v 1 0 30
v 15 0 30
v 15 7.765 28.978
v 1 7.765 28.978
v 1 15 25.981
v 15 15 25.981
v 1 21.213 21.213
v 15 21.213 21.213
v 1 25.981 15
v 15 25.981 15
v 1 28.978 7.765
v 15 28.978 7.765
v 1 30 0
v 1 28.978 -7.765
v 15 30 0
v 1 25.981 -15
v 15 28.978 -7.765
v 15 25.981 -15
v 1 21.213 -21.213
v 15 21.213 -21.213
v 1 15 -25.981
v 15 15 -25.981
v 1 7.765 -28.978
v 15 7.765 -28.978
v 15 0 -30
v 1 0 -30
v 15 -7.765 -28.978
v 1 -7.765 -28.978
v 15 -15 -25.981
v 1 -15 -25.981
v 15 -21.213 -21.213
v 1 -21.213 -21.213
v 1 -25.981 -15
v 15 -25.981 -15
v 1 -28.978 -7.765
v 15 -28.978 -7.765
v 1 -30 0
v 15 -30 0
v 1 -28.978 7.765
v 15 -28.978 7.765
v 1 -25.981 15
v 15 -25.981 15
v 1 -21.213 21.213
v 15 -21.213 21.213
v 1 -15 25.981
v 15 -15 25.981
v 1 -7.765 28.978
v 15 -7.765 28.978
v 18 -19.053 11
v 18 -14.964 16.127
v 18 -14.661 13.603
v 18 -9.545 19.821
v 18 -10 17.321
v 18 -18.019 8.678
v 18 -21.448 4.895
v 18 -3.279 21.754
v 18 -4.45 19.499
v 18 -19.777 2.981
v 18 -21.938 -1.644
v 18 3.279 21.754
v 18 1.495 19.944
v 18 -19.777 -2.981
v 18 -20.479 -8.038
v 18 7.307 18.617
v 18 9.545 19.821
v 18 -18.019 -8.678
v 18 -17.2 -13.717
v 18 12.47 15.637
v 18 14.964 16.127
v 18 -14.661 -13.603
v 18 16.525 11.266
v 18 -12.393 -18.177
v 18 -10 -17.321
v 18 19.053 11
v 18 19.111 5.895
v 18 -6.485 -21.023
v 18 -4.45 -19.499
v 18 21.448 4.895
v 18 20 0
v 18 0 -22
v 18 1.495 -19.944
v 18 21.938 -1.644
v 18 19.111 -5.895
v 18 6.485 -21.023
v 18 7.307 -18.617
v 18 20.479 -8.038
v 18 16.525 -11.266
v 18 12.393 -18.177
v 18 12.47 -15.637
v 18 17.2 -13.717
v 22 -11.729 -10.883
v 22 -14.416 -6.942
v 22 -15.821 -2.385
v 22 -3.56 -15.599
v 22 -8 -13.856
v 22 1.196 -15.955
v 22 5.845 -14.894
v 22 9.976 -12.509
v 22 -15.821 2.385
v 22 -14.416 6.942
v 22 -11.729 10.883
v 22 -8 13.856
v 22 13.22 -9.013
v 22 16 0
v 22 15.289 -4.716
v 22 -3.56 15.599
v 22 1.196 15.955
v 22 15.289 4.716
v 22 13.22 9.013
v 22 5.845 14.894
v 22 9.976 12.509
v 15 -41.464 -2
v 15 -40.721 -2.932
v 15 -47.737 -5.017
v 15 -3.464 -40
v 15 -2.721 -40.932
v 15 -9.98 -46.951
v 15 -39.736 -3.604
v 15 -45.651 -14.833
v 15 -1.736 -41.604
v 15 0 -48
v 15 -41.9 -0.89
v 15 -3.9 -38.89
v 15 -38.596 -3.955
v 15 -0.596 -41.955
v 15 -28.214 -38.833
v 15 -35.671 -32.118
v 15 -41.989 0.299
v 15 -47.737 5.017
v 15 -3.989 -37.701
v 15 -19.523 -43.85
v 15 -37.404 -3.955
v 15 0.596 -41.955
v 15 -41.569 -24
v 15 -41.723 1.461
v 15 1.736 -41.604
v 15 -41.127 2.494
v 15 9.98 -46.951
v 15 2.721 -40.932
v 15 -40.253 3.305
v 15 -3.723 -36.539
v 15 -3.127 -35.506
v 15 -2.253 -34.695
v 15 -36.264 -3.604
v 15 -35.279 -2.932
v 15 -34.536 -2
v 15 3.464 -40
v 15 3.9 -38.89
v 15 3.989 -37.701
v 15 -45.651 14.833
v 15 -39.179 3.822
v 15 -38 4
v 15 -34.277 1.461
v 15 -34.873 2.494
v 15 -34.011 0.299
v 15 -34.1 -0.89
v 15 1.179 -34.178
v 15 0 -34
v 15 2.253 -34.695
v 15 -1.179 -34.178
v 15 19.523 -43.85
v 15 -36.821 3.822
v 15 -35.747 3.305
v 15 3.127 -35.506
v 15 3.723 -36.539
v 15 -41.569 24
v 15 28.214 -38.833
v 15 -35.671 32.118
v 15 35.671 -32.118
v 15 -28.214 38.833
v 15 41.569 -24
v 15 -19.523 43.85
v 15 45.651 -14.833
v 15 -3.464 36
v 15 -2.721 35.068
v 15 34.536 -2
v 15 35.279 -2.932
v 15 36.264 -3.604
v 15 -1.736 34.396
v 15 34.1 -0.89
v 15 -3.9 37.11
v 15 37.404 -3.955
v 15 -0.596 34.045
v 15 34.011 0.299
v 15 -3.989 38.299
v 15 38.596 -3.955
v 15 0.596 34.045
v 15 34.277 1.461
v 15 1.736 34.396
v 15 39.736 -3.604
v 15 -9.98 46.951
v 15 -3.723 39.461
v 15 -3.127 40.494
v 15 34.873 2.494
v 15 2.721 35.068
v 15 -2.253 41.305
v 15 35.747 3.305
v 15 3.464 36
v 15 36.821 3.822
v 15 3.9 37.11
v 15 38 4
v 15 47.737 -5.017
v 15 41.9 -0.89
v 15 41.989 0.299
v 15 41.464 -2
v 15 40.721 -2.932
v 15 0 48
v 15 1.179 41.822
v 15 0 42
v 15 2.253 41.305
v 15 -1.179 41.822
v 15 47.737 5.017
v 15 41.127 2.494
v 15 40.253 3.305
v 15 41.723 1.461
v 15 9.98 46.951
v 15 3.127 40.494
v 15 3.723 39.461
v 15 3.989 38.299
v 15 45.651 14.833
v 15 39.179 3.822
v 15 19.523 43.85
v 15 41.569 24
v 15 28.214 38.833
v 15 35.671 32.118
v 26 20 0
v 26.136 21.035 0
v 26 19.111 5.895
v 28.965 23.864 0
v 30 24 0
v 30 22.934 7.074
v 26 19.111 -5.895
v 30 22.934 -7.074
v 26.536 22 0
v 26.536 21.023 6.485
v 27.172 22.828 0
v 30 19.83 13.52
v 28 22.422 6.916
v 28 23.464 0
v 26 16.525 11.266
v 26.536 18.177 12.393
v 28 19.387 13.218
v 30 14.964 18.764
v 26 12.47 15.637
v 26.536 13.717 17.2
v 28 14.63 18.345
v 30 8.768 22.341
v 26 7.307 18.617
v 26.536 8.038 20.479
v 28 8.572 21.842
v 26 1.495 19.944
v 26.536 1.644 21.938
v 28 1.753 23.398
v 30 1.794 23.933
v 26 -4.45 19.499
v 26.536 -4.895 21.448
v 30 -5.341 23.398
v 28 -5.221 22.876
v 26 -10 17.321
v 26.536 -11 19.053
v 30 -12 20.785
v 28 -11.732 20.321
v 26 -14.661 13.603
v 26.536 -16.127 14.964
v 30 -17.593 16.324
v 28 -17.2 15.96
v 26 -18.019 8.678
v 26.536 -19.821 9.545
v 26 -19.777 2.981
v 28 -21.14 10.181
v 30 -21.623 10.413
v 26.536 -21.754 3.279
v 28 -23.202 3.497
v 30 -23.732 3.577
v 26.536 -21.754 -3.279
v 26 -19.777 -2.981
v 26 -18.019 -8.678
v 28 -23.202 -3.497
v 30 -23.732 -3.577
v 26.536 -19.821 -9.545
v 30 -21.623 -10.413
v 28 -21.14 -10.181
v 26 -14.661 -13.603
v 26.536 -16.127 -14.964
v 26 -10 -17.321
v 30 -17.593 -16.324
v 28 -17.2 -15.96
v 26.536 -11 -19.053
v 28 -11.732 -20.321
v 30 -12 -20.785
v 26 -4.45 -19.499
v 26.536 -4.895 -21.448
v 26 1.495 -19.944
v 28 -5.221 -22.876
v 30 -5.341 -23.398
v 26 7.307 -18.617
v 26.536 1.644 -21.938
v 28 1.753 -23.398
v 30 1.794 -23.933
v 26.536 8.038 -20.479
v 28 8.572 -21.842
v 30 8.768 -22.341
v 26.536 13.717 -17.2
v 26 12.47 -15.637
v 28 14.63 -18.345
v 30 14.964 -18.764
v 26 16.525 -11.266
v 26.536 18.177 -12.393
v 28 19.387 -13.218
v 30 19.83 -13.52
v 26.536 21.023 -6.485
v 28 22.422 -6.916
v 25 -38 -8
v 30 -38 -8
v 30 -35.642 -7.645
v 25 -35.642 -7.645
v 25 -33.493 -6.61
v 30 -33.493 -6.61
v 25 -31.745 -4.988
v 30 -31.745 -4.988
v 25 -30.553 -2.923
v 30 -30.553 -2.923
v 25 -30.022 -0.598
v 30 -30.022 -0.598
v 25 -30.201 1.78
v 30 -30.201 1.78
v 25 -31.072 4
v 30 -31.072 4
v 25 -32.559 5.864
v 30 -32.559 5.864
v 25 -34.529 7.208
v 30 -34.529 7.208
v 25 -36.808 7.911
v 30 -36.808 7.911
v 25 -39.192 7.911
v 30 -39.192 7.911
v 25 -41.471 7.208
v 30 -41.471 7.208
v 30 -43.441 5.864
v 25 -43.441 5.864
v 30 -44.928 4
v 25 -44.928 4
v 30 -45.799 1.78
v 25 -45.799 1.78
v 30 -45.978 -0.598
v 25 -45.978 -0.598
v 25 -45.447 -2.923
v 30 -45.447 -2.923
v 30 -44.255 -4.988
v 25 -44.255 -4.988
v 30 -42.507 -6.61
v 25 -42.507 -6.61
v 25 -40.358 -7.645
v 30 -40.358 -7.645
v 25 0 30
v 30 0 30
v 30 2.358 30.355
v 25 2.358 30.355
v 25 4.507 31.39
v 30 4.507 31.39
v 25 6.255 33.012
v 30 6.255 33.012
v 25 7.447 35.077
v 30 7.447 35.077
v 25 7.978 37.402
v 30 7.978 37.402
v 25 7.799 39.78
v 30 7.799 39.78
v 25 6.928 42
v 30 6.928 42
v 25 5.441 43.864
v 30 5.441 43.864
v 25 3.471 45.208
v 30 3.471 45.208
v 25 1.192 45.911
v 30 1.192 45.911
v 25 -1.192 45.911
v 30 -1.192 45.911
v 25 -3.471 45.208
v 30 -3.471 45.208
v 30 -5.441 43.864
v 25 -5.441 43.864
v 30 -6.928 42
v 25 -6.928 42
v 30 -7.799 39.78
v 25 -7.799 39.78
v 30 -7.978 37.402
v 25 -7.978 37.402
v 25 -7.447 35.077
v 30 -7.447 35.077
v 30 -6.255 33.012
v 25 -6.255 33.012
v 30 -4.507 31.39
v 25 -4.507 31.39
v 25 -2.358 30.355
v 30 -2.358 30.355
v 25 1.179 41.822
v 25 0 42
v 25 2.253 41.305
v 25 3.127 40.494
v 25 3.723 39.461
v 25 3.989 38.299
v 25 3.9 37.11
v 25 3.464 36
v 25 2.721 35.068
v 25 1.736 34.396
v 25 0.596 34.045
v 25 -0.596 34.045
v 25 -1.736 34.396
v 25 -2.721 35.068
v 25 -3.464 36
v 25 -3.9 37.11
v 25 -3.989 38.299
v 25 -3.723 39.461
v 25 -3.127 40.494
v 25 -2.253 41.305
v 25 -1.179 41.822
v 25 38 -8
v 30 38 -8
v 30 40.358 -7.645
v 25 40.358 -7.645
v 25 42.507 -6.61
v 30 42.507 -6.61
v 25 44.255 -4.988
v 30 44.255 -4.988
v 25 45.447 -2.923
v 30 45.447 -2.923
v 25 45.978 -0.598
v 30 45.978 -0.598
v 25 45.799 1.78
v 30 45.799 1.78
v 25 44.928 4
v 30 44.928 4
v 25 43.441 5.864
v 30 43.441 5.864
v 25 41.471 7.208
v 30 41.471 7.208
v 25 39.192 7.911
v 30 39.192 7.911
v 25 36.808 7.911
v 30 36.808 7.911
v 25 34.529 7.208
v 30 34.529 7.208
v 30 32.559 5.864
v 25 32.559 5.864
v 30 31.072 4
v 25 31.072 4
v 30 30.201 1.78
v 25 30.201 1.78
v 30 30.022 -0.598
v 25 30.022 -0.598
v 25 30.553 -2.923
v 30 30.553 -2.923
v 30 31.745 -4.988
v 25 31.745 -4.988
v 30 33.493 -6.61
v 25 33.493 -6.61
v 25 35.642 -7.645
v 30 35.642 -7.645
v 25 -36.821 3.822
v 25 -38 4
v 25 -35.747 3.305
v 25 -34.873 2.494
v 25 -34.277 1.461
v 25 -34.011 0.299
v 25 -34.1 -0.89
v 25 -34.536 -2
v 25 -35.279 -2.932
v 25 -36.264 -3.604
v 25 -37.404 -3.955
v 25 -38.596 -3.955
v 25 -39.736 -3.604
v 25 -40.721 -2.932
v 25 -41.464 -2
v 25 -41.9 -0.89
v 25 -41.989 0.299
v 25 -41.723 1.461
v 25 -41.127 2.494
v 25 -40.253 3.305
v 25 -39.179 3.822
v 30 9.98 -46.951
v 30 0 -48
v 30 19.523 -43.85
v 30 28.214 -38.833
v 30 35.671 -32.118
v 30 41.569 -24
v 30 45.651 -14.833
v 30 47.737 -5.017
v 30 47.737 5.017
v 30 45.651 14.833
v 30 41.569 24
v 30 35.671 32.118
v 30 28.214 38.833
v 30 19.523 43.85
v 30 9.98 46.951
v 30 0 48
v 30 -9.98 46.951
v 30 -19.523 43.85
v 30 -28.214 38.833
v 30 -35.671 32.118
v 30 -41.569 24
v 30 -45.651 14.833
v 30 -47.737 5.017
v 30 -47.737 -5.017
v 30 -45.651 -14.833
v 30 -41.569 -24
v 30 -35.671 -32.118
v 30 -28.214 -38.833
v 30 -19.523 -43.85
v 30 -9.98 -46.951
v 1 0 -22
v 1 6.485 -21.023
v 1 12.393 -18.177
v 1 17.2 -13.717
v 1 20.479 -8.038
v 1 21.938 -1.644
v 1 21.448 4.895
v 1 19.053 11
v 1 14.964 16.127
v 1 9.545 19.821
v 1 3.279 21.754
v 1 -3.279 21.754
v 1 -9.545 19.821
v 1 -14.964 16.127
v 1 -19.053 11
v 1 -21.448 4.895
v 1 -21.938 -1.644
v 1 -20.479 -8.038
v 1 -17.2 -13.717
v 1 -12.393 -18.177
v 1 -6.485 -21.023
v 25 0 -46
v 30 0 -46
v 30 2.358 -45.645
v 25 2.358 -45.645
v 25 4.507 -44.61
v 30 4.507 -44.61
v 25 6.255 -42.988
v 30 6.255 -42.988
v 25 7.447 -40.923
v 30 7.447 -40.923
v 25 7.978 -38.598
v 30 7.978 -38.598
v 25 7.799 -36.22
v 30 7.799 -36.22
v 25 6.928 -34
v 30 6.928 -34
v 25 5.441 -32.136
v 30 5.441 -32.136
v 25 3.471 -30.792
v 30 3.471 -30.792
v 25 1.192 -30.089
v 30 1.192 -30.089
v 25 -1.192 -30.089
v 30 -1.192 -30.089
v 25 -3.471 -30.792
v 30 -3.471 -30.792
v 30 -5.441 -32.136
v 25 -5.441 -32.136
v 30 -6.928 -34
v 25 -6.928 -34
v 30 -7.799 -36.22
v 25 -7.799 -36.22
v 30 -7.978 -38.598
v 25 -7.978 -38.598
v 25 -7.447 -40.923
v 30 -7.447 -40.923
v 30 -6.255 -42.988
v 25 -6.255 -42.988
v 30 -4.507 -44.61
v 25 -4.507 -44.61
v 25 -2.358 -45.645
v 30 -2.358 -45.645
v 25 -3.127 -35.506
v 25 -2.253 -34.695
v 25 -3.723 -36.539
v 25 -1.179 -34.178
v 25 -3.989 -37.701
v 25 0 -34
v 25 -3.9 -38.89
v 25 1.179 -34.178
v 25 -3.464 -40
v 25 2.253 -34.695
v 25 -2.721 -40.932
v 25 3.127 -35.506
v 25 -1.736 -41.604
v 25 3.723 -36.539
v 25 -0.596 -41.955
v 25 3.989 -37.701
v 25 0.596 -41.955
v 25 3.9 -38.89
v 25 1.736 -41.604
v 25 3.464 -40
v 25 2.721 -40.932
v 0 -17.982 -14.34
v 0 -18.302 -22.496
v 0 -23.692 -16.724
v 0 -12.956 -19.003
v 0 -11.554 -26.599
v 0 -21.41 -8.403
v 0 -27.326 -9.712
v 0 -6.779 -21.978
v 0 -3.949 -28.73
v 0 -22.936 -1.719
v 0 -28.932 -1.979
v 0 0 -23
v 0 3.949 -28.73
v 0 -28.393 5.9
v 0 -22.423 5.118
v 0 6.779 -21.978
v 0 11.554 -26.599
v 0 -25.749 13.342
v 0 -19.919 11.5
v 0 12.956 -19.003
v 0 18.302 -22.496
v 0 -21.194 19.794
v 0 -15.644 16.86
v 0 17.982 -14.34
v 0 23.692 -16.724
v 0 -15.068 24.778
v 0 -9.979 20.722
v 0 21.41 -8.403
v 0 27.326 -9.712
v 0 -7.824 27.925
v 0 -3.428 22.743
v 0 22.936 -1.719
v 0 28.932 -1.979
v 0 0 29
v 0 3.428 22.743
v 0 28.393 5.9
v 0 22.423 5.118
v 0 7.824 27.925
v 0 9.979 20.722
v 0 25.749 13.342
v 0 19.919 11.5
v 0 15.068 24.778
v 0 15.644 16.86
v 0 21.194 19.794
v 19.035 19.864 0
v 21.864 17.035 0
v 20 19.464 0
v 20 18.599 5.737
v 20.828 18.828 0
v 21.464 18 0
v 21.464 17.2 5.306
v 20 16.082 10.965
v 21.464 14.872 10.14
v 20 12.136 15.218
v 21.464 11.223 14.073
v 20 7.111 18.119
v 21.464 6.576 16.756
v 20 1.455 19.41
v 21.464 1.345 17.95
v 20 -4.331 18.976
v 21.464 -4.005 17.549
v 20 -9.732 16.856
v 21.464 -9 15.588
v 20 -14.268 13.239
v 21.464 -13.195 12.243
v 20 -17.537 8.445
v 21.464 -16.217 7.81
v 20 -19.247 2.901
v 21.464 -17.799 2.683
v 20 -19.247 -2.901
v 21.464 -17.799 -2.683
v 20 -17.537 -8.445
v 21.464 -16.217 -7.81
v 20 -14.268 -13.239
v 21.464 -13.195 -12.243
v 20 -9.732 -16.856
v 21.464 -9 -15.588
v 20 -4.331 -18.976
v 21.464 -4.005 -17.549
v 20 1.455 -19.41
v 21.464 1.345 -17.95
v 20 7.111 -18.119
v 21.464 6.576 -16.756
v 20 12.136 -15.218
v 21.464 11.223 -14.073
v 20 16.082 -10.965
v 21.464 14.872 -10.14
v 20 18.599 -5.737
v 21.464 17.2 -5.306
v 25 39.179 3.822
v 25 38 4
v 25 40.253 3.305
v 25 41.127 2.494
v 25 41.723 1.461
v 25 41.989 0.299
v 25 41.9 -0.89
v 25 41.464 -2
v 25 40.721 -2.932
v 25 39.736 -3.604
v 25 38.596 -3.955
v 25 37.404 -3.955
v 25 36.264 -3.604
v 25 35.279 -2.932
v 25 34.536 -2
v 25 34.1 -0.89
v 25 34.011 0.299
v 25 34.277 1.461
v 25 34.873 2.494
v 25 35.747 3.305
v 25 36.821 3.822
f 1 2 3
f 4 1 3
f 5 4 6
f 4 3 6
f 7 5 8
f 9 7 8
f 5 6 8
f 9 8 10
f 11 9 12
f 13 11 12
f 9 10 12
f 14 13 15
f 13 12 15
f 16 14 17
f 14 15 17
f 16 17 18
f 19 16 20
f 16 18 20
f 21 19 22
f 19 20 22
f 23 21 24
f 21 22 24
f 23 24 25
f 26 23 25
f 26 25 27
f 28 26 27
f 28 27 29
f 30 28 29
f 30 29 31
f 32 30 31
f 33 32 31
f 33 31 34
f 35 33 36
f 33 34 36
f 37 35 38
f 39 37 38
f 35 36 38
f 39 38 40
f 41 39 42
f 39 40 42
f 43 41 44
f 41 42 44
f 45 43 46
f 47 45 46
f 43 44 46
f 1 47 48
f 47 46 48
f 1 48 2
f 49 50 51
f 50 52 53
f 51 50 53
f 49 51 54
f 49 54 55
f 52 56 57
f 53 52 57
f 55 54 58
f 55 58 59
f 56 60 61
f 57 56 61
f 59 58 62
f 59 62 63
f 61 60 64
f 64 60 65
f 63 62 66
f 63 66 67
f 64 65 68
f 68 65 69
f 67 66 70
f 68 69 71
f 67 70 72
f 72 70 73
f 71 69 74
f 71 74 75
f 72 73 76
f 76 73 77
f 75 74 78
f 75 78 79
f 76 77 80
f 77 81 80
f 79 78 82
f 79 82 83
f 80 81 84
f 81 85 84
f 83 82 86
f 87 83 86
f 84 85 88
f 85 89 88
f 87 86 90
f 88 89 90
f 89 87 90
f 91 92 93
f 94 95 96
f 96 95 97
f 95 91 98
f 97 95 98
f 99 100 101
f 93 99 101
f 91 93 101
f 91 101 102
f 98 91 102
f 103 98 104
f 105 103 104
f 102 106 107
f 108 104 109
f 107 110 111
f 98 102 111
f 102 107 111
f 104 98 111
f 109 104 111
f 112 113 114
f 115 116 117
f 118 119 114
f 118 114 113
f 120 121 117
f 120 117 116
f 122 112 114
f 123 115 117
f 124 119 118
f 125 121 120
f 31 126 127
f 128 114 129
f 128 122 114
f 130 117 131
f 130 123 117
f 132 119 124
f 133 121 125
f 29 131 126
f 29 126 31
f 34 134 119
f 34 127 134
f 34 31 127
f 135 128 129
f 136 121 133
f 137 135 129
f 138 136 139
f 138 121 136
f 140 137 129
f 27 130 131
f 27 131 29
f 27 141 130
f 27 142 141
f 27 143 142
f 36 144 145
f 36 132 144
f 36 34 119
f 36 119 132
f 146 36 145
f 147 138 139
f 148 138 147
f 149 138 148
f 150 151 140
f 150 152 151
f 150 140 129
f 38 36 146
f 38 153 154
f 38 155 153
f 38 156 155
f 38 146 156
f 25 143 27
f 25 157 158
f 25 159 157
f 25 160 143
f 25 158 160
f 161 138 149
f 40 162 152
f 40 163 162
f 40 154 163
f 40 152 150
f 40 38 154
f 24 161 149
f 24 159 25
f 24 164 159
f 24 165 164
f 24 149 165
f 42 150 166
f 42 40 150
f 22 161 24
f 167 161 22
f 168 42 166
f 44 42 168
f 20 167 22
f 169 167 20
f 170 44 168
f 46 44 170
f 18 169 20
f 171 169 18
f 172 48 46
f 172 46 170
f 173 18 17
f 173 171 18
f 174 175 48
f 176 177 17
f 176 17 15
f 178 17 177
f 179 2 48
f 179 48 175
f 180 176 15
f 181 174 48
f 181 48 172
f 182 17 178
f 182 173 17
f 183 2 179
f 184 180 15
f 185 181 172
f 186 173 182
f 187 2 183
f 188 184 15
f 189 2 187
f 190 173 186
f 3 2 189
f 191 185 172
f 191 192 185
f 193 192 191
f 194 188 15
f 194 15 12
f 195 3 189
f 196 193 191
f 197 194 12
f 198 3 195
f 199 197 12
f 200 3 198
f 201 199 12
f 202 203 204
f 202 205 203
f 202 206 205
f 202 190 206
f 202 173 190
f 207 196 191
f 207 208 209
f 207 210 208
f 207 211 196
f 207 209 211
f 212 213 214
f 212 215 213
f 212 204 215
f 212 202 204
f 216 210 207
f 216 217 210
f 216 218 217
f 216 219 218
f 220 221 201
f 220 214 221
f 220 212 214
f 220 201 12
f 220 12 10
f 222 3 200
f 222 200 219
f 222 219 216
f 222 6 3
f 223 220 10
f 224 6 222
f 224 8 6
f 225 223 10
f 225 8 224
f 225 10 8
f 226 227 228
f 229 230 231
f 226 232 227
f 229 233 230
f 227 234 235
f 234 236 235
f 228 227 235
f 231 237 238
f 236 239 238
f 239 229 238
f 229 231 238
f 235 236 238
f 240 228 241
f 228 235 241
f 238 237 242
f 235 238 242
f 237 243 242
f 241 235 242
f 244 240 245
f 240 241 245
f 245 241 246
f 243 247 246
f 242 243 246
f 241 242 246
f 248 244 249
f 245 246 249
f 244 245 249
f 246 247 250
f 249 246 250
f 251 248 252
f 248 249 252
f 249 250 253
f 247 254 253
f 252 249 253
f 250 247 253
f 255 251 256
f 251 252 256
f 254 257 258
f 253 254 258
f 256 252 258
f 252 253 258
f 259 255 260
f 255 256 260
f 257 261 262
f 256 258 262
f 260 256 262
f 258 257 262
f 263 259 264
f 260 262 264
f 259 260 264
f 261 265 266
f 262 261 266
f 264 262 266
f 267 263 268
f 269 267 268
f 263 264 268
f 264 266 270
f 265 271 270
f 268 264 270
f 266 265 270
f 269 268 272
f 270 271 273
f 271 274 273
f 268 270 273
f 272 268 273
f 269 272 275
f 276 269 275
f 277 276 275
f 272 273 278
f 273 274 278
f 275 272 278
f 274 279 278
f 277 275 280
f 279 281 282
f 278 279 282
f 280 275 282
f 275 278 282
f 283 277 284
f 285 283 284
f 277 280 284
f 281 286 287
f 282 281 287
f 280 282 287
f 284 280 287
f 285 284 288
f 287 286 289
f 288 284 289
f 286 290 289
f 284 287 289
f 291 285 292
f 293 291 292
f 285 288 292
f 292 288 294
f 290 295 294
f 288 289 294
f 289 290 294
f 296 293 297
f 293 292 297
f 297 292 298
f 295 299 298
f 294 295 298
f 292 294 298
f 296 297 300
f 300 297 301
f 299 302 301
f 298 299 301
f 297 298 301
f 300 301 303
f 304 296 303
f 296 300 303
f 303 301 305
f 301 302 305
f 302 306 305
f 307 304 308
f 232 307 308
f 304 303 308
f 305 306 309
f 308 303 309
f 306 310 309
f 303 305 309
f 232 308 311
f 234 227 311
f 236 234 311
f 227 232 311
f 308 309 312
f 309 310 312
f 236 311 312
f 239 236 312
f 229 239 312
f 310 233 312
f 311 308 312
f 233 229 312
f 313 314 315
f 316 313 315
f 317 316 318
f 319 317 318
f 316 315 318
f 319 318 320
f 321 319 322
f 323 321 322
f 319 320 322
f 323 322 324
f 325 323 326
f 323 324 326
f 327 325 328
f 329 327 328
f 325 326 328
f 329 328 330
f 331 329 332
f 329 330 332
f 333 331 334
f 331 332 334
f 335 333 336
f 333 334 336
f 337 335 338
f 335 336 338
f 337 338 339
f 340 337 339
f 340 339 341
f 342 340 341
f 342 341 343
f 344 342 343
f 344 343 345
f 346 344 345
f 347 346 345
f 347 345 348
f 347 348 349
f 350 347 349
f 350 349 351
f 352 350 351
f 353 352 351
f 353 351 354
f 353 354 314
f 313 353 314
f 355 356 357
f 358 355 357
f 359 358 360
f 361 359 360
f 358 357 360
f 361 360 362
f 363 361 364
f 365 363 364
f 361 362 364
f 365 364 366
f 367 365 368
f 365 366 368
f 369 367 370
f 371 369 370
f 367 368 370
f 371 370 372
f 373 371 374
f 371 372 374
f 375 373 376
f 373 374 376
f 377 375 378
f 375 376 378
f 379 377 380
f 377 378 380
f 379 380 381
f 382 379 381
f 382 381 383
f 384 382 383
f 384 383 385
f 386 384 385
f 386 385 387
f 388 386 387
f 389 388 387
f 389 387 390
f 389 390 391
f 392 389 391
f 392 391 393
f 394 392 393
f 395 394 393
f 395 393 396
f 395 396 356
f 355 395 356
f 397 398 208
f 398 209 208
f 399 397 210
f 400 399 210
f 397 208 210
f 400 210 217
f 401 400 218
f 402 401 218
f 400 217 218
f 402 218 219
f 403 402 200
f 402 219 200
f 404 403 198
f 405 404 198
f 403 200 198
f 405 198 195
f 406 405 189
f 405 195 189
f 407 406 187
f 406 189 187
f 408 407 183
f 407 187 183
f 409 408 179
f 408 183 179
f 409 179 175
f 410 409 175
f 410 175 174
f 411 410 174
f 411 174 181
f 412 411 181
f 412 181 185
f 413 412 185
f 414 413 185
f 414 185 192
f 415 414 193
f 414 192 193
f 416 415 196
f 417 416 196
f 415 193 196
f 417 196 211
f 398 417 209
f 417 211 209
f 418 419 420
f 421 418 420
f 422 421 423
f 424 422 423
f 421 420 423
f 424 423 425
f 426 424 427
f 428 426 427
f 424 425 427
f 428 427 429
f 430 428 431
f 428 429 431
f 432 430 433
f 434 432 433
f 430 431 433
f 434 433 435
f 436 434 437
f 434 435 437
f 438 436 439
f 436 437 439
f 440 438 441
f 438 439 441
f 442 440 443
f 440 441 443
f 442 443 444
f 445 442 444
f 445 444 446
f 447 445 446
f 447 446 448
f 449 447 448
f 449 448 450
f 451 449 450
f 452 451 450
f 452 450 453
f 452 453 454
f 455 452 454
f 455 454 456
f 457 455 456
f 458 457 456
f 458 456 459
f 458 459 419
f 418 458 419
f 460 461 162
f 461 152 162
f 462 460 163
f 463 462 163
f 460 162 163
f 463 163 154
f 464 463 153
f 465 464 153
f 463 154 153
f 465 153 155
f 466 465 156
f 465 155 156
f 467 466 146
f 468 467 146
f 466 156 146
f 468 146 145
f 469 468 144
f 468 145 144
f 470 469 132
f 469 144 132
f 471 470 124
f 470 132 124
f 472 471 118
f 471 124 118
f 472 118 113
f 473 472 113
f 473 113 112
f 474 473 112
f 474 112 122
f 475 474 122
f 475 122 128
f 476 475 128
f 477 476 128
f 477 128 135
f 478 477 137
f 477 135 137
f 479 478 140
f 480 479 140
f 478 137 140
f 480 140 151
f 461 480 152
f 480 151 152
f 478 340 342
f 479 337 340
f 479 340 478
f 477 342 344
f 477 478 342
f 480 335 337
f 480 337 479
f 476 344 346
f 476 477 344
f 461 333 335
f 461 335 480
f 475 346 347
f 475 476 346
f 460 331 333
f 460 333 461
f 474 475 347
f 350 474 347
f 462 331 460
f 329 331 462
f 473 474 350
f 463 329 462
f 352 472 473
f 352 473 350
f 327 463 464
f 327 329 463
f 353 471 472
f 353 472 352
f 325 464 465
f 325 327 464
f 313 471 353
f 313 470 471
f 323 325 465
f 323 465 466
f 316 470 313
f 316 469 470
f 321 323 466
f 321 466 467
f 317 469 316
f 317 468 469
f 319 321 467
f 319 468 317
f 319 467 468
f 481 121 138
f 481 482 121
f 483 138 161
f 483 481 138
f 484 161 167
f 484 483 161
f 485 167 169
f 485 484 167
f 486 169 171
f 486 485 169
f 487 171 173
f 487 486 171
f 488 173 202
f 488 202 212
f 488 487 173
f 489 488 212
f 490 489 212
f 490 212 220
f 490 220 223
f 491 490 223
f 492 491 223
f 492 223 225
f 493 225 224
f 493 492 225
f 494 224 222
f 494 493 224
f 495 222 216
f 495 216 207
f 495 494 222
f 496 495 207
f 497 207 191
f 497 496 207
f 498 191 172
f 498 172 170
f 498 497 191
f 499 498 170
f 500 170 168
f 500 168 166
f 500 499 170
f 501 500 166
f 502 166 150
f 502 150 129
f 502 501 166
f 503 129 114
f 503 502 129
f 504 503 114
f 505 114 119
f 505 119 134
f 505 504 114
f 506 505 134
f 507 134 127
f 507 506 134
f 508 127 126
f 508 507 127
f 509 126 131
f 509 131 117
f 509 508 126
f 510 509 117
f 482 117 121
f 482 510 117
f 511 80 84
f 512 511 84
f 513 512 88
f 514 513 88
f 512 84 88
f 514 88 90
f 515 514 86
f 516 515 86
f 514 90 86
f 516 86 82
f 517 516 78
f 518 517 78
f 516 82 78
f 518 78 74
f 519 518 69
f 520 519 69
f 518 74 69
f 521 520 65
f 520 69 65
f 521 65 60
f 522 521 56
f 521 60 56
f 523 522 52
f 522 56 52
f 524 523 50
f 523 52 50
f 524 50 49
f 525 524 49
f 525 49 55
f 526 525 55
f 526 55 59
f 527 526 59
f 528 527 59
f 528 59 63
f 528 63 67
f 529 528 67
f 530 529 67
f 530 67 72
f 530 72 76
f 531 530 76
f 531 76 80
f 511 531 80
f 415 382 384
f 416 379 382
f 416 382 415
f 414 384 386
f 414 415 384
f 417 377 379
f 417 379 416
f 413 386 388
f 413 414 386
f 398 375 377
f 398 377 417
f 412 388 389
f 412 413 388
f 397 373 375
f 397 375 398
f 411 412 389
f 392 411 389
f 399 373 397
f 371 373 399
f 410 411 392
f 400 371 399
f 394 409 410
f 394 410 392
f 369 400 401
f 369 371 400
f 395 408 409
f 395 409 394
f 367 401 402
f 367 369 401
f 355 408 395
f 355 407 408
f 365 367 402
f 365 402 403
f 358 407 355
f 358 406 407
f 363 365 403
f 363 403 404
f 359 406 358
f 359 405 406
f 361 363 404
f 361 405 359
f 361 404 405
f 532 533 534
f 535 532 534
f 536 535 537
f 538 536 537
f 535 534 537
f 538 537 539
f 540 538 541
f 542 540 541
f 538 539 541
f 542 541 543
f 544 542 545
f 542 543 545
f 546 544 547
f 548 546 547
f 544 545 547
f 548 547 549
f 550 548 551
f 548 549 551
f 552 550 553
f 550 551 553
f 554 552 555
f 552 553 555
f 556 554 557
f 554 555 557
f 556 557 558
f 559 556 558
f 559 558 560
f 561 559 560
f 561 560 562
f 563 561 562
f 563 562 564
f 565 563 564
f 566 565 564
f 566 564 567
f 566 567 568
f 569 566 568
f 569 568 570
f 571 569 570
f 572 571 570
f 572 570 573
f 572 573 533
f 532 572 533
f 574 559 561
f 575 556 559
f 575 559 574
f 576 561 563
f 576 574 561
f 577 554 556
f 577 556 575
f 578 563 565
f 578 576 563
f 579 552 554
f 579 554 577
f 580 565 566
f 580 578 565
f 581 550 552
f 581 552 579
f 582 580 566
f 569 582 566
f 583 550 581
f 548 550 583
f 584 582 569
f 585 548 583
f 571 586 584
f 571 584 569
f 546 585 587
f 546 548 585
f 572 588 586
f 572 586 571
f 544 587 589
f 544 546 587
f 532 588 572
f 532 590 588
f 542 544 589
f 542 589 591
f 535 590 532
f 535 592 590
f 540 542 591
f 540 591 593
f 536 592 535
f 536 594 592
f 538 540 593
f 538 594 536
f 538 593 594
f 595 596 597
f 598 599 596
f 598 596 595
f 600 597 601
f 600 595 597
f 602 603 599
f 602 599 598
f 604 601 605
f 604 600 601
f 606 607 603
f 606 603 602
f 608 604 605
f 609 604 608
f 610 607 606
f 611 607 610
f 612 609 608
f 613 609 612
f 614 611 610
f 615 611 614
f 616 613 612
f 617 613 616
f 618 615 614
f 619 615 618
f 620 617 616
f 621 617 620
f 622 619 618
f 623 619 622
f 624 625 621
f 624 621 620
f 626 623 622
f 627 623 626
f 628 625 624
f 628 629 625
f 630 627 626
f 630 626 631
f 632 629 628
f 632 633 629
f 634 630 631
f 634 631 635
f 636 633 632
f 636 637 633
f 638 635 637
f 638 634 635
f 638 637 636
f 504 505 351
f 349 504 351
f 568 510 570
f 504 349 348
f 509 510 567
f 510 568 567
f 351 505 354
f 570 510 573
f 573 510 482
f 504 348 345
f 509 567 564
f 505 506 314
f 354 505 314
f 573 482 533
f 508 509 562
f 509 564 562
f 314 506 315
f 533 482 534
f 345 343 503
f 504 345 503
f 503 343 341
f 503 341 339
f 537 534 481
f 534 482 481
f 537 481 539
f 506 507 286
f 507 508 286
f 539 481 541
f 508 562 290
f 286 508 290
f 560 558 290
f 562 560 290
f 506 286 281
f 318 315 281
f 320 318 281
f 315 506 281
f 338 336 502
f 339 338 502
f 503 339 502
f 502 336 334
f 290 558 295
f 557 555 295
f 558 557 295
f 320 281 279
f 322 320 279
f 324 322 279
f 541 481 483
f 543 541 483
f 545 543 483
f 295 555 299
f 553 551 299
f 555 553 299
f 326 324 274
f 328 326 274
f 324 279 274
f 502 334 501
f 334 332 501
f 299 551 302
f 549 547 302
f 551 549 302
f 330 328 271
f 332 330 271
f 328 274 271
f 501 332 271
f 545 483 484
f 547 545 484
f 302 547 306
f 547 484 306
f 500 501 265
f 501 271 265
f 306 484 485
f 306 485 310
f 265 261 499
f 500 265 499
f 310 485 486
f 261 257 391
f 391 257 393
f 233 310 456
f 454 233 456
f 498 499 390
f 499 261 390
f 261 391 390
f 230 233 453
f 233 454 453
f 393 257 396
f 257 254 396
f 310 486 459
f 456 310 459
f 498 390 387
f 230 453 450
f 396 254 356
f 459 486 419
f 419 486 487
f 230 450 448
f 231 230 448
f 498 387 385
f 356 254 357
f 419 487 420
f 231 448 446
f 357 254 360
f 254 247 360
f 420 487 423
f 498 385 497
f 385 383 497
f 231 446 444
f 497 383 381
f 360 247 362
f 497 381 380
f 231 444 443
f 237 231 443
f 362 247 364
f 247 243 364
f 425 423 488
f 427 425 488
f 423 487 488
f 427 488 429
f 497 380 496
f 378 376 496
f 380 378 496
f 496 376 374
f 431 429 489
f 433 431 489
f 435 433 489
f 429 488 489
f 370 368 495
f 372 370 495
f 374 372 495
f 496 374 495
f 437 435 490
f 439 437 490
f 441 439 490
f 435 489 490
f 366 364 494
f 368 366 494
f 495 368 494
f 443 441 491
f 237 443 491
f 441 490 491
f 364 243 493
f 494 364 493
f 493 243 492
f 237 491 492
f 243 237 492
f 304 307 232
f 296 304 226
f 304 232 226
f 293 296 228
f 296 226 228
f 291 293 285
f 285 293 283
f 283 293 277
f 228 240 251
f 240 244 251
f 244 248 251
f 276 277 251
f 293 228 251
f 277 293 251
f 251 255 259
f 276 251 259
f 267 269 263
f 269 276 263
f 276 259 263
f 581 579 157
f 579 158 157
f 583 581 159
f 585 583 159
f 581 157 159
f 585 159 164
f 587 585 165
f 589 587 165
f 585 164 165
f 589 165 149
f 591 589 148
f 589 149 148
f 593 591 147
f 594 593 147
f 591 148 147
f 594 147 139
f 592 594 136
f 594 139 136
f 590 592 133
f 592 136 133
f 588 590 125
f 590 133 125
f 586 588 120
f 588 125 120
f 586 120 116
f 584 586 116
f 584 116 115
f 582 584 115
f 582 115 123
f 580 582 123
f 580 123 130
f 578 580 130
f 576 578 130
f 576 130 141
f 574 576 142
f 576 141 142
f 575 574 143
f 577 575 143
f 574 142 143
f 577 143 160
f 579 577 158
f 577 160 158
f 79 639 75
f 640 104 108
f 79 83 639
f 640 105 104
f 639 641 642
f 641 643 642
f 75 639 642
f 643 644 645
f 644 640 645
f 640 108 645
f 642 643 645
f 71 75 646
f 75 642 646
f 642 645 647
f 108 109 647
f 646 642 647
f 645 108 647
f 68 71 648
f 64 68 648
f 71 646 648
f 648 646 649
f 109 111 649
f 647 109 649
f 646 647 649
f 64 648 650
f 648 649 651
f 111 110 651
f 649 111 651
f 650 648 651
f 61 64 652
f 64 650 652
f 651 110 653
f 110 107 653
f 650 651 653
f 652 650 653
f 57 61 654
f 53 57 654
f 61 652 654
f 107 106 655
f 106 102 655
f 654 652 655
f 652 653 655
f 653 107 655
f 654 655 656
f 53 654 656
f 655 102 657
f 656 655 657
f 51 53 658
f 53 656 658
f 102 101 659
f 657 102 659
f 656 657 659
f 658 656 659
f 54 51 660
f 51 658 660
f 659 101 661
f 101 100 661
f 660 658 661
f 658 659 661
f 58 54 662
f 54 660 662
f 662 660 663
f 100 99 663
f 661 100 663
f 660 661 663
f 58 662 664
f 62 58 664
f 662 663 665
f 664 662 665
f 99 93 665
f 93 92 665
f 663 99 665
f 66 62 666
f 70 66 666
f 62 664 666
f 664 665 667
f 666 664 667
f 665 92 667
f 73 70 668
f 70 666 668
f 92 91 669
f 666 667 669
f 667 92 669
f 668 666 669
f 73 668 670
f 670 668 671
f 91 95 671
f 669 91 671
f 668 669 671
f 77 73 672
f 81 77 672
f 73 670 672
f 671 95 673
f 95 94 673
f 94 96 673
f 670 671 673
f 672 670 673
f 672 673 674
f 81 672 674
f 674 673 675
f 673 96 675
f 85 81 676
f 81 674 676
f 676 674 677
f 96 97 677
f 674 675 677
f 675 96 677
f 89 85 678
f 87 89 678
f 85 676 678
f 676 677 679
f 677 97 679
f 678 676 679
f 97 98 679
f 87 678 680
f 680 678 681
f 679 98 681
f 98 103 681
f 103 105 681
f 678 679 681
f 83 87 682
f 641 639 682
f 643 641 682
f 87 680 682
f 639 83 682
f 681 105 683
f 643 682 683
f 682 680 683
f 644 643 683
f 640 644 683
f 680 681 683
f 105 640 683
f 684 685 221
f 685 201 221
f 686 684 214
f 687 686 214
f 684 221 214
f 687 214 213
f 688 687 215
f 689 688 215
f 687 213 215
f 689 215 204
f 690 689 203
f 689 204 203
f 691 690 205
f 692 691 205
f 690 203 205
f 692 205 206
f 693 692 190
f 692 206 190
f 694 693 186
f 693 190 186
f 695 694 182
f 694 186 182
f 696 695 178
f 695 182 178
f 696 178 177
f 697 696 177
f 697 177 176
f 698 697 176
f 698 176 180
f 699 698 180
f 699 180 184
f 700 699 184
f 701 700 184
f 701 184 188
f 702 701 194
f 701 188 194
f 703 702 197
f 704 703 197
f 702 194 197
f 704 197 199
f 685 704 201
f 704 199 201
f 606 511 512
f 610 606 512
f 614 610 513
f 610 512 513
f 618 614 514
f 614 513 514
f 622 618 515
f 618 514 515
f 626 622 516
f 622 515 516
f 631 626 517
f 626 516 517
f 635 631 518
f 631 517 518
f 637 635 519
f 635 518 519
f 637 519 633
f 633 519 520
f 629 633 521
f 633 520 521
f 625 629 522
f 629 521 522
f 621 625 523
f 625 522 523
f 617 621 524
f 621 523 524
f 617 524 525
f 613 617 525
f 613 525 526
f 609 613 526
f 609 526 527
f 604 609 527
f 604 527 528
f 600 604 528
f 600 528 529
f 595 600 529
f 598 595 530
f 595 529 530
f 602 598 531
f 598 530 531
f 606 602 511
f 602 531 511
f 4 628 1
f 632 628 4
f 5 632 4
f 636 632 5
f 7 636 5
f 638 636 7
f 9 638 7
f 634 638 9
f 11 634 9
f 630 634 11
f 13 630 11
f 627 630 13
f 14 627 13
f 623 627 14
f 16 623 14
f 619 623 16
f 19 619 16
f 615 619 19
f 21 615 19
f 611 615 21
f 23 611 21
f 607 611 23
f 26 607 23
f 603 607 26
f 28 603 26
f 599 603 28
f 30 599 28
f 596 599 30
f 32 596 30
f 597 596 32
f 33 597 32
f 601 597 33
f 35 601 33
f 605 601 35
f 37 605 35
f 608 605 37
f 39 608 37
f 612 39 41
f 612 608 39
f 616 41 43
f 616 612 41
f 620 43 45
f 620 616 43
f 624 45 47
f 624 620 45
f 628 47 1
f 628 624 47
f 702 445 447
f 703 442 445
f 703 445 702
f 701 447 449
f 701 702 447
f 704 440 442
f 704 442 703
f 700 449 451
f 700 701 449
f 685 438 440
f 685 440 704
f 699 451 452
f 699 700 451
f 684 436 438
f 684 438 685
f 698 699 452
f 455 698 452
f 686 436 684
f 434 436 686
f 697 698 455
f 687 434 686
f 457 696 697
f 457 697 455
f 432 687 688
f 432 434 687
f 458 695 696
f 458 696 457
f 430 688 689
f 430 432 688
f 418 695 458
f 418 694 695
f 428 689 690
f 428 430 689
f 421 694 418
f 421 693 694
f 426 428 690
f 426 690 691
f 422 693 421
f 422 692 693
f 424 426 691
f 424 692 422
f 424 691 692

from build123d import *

# Parameters (mm, degrees)
ESQUISSE1_W           = 15
ESQUISSE1_H           = 48
ESQUISSE2_R           = 30
EXTRUSION1_DEPTH      = 15
D_GAGEMENT_M391_D     = 44
D_GAGEMENT_M391_DEPTH = 18
PER_AGE1_D            = 8
PER_AGE1_CBORE_D      = 16
PER_AGE1_CBORE_DEPTH  = 5
PER_AGE2_D            = 8
PER_AGE2_CBORE_D      = 16
PER_AGE2_CBORE_DEPTH  = 5
PER_AGE3_D            = 8
PER_AGE3_CBORE_D      = 16
PER_AGE3_CBORE_DEPTH  = 5
PER_AGE4_D            = 8
PER_AGE4_CBORE_D      = 16
PER_AGE4_CBORE_DEPTH  = 5
CHANFREIN1_SIZE       = 1


# Read off the part's stored shape, not the designer's step: Enlèvement de matière-épaissir1, Enlèvement de matière-épaissir2
with BuildPart() as part:
    # Esquisse1 → Révolution1 (revolve)
    with BuildSketch(Plane.XY, mode=Mode.PRIVATE) as r_volution1_sk:
        with Locations((22.5, 24)):
            Rectangle(ESQUISSE1_W, ESQUISSE1_H)
    revolve(r_volution1_sk.sketch.rotate(Axis((15, 0, 0), (1, 0, 0)), 270), axis=Axis((15, 0, 0), (1, 0, 0)))

    # Esquisse2 → Extrusion1 (add)
    with BuildSketch(Plane.ZY.offset(-15)):
        Circle(ESQUISSE2_R)
    extrude(amount=EXTRUSION1_DEPTH)

    # Dégagement M391
    with Locations(Plane.ZY):
        with Locations((0, 0)):
            Hole(D_GAGEMENT_M391_D / 2, depth=D_GAGEMENT_M391_DEPTH)

    # Enlèvement de matière-épaissir1 outline → Enlèvement de matière-épaissir1 (revolve, cut)
    with BuildSketch(Plane.YX):
        with BuildLine():
            Line((0, 18), (20, 18))
            ThreePointArc((20, 18), (18.828427125, 20.828427125), (16, 22))
            Line((16, 22), (0, 22))
            Line((0, 22), (0, 18))
        make_face()
    revolve(axis=Axis((0, 0, 0), (1, 0, 0)), mode=Mode.SUBTRACT)

    # Enlèvement de matière-épaissir2 outline → Enlèvement de matière-épaissir2 (revolve, cut)
    with BuildSketch(Plane.YX):
        with BuildLine():
            Line((0, 26), (20, 26))
            ThreePointArc((20, 26), (22.828427125, 27.171572875), (24, 30))
            Line((24, 30), (0, 30))
            Line((0, 30), (0, 26))
        make_face()
    revolve(axis=Axis((0, 0, 0), (1, 0, 0)), mode=Mode.SUBTRACT)

    # Perçage1 (through all)
    with Locations(Plane(origin=(30, 0, 0), x_dir=(0, 0, -1), z_dir=(1, 0, 0))):
        with Locations((-38, 0)):
            CounterBoreHole(PER_AGE1_D / 2, PER_AGE1_CBORE_D / 2, PER_AGE1_CBORE_DEPTH)

    # Perçage2 (through all)
    with Locations(Plane(origin=(30, 0, 0), x_dir=(0, 0, -1), z_dir=(1, 0, 0))):
        with Locations((0, -38)):
            CounterBoreHole(PER_AGE2_D / 2, PER_AGE2_CBORE_D / 2, PER_AGE2_CBORE_DEPTH)

    # Perçage3 (through all)
    with Locations(Plane(origin=(30, 0, 0), x_dir=(0, 0, -1), z_dir=(1, 0, 0))):
        with Locations((0, 38)):
            CounterBoreHole(PER_AGE3_D / 2, PER_AGE3_CBORE_D / 2, PER_AGE3_CBORE_DEPTH)

    # Perçage4 (through all)
    with Locations(Plane(origin=(30, 0, 0), x_dir=(0, 0, -1), z_dir=(1, 0, 0))):
        with Locations((38, 0)):
            CounterBoreHole(PER_AGE4_D / 2, PER_AGE4_CBORE_D / 2, PER_AGE4_CBORE_DEPTH)

    # Chanfrein1
    chanfrein1_edges = [part.edges().sort_by_distance(p)[0] for p in [
        (0, 0, 22),
        (0, 0, -30),
    ]]
    chamfer(chanfrein1_edges, length=CHANFREIN1_SIZE)


solid = part.part
